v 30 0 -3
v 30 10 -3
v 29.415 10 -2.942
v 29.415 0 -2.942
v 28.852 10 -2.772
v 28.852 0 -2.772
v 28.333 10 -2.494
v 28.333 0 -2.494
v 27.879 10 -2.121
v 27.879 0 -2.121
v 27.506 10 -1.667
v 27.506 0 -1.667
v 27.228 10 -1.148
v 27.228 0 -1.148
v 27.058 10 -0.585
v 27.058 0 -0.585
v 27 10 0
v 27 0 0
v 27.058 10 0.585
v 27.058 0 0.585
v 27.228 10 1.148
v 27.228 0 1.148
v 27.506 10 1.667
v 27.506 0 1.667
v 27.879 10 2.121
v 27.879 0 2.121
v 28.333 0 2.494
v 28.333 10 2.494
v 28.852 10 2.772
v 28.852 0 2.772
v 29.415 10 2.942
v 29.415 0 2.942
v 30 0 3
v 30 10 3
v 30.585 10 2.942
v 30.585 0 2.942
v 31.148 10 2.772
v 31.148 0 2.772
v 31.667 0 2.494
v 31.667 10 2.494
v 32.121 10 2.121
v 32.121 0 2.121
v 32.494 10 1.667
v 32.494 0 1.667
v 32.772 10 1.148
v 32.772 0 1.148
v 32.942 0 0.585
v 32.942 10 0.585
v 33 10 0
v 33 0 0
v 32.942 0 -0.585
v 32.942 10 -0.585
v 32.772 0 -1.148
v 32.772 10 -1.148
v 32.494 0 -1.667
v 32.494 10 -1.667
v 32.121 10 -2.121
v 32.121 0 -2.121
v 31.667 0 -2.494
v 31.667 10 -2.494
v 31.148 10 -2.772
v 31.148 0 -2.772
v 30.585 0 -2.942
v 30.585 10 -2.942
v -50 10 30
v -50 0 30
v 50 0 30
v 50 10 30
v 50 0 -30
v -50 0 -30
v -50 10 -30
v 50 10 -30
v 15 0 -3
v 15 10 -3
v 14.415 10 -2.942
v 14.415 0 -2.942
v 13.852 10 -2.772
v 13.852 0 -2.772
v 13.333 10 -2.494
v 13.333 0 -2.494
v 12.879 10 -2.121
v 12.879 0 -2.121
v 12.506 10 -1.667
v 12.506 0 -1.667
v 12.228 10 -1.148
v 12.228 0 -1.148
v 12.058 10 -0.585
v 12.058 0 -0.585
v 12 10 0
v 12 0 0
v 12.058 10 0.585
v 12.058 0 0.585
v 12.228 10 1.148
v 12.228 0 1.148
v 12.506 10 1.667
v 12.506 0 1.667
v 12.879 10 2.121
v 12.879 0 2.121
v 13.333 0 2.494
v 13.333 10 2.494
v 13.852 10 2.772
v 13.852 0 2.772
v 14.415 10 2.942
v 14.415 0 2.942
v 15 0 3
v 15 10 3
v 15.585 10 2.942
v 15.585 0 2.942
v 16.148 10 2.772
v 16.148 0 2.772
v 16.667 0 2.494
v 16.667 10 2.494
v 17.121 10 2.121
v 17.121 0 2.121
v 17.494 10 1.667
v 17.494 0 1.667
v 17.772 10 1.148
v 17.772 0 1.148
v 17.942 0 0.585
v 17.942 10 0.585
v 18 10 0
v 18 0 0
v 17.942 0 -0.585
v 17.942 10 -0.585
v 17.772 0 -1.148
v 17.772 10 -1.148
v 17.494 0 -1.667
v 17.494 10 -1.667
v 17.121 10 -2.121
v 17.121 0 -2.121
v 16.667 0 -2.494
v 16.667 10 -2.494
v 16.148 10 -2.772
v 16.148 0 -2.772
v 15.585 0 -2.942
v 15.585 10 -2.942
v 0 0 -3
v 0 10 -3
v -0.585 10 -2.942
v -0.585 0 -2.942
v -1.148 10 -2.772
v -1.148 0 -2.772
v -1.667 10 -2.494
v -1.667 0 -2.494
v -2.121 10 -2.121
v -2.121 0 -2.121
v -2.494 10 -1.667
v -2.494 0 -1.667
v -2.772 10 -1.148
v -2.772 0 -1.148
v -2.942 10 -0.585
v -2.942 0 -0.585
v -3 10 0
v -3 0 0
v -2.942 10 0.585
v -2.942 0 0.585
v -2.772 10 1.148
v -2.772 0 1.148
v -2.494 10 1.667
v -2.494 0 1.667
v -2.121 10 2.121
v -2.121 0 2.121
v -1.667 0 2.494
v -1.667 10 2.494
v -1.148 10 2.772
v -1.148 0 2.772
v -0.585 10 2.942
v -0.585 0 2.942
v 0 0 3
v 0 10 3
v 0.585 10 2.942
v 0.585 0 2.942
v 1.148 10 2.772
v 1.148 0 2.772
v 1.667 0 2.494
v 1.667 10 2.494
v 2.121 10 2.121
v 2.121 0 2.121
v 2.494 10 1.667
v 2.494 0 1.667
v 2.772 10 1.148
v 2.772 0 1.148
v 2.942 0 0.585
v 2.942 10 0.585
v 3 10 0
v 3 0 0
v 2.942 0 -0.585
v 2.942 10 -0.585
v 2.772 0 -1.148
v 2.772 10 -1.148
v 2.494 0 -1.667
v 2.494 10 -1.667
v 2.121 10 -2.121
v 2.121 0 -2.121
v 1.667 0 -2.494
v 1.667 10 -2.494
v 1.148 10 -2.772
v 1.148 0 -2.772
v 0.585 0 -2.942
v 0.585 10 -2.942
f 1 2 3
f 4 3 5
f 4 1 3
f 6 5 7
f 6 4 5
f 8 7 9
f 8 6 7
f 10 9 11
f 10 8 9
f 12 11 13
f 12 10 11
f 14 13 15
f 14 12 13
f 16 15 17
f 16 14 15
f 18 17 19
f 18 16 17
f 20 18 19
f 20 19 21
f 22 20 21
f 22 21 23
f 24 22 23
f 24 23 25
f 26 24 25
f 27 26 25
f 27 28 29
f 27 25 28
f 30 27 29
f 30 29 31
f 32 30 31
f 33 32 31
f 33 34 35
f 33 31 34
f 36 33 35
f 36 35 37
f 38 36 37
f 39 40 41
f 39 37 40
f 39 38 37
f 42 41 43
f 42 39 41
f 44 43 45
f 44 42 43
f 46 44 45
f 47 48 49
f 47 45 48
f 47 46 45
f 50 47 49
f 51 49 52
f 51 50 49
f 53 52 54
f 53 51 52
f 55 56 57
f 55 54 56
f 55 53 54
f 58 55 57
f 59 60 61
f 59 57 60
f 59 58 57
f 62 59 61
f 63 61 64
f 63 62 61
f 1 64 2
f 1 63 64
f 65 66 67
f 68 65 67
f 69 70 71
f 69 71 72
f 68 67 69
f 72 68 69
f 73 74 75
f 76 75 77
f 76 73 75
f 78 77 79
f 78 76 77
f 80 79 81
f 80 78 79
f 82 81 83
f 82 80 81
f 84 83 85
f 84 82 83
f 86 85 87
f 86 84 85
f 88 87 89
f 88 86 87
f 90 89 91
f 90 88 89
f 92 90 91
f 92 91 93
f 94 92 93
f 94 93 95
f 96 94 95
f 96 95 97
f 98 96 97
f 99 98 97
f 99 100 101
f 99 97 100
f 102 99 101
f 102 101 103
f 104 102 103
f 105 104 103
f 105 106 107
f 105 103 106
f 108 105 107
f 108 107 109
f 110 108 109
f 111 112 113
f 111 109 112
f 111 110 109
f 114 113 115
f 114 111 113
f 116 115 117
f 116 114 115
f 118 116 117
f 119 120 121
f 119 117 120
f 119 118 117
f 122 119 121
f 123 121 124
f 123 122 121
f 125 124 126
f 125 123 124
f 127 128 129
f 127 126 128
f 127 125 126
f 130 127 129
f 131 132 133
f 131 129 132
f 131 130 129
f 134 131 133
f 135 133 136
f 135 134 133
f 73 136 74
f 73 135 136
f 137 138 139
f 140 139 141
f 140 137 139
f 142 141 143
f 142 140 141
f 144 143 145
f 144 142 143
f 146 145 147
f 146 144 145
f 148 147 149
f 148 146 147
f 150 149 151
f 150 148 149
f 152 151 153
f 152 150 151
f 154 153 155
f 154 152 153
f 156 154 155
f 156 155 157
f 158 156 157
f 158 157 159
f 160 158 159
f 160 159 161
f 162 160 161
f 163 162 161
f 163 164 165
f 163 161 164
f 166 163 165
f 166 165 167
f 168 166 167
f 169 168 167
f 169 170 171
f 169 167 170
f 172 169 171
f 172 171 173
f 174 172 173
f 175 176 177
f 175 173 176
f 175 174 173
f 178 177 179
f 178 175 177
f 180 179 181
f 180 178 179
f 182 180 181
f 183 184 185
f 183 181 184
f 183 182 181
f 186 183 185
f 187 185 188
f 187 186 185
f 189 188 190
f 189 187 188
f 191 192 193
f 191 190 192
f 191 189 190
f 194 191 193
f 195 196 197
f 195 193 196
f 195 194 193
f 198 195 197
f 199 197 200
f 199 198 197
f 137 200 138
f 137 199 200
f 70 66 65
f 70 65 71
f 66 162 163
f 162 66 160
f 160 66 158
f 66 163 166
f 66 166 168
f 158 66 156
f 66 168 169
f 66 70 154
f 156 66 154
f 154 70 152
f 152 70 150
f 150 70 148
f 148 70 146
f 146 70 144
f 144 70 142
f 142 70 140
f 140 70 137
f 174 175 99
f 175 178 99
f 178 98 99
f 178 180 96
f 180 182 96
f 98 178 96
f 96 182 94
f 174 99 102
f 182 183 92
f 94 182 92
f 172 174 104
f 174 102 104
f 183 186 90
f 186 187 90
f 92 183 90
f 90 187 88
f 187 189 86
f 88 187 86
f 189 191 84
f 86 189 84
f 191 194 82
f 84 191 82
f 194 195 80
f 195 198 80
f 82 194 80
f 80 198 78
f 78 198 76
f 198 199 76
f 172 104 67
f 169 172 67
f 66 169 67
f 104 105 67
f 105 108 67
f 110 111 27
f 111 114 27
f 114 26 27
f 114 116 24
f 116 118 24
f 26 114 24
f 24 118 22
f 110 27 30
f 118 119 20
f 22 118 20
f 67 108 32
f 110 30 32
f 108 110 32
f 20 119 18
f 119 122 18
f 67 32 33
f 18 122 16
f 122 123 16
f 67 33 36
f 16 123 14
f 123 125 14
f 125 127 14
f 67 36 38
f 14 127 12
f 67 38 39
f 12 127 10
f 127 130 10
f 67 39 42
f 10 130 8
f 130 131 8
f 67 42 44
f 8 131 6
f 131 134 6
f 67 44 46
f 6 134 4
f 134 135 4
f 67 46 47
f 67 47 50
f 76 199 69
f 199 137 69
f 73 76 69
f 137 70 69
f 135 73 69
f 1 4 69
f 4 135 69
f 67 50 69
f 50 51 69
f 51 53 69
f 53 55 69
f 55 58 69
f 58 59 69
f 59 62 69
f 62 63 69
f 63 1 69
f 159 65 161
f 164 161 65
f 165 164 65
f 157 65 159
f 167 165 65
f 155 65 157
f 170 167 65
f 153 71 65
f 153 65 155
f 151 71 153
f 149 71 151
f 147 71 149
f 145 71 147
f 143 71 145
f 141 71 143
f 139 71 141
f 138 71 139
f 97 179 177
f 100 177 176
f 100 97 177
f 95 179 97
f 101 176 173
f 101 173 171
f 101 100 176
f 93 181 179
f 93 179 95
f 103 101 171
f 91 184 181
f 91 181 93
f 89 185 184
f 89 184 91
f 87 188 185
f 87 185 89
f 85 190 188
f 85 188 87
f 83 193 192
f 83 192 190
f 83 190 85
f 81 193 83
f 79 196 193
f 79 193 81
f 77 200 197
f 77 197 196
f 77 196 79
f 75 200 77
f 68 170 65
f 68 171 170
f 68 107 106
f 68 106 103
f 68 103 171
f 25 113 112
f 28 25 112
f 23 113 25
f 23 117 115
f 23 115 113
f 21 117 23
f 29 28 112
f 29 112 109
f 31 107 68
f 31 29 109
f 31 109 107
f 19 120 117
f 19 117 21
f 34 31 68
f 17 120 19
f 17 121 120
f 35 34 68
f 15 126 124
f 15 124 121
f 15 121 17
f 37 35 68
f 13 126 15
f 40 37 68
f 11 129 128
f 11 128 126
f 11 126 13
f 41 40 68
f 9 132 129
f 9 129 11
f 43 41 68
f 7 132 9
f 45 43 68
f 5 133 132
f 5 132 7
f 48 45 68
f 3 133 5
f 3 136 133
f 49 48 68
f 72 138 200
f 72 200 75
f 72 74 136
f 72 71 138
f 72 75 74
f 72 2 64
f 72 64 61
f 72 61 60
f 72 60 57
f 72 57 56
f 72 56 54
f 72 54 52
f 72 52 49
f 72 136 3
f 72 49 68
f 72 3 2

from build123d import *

# Parameters (mm, degrees)
SKETCH_1_W             = 100
SKETCH_1_H             = 60
EXTRUDE_1_DEPTH        = 10
SKETCH_2_R             = 3
CUT_EXTRUDE_1_DEPTH    = 20
PATTERN_LINEAR_1_COUNT = 3
PATTERN_LINEAR_1_PITCH = 15


with BuildPart() as part:
    # 草图1 → 凸台-拉伸1 (new body)
    with BuildSketch(Plane(origin=(0, 0, 0), x_dir=(1, 0, 0), z_dir=(0, 1, 0))):
        Rectangle(SKETCH_1_W, SKETCH_1_H)
    extrude(amount=EXTRUDE_1_DEPTH)

    # 草图2 → 切除-拉伸1 (cut)
    with BuildSketch(Plane(origin=(0, 0, 0), x_dir=(1, 0, 0), z_dir=(0, 1, 0))):
        with Locations(Location((30, 0, 0), (0, 0, 90))):
            Circle(SKETCH_2_R)
    cut_extrude_1 = extrude(amount=CUT_EXTRUDE_1_DEPTH, mode=Mode.SUBTRACT)

    # 阵列(线性)1: 切除-拉伸1 ×3
    with Locations(*[(-i * PATTERN_LINEAR_1_PITCH, 0, 0) for i in range(1, PATTERN_LINEAR_1_COUNT)]):
        add(cut_extrude_1, mode=Mode.SUBTRACT)


solid = part.part
